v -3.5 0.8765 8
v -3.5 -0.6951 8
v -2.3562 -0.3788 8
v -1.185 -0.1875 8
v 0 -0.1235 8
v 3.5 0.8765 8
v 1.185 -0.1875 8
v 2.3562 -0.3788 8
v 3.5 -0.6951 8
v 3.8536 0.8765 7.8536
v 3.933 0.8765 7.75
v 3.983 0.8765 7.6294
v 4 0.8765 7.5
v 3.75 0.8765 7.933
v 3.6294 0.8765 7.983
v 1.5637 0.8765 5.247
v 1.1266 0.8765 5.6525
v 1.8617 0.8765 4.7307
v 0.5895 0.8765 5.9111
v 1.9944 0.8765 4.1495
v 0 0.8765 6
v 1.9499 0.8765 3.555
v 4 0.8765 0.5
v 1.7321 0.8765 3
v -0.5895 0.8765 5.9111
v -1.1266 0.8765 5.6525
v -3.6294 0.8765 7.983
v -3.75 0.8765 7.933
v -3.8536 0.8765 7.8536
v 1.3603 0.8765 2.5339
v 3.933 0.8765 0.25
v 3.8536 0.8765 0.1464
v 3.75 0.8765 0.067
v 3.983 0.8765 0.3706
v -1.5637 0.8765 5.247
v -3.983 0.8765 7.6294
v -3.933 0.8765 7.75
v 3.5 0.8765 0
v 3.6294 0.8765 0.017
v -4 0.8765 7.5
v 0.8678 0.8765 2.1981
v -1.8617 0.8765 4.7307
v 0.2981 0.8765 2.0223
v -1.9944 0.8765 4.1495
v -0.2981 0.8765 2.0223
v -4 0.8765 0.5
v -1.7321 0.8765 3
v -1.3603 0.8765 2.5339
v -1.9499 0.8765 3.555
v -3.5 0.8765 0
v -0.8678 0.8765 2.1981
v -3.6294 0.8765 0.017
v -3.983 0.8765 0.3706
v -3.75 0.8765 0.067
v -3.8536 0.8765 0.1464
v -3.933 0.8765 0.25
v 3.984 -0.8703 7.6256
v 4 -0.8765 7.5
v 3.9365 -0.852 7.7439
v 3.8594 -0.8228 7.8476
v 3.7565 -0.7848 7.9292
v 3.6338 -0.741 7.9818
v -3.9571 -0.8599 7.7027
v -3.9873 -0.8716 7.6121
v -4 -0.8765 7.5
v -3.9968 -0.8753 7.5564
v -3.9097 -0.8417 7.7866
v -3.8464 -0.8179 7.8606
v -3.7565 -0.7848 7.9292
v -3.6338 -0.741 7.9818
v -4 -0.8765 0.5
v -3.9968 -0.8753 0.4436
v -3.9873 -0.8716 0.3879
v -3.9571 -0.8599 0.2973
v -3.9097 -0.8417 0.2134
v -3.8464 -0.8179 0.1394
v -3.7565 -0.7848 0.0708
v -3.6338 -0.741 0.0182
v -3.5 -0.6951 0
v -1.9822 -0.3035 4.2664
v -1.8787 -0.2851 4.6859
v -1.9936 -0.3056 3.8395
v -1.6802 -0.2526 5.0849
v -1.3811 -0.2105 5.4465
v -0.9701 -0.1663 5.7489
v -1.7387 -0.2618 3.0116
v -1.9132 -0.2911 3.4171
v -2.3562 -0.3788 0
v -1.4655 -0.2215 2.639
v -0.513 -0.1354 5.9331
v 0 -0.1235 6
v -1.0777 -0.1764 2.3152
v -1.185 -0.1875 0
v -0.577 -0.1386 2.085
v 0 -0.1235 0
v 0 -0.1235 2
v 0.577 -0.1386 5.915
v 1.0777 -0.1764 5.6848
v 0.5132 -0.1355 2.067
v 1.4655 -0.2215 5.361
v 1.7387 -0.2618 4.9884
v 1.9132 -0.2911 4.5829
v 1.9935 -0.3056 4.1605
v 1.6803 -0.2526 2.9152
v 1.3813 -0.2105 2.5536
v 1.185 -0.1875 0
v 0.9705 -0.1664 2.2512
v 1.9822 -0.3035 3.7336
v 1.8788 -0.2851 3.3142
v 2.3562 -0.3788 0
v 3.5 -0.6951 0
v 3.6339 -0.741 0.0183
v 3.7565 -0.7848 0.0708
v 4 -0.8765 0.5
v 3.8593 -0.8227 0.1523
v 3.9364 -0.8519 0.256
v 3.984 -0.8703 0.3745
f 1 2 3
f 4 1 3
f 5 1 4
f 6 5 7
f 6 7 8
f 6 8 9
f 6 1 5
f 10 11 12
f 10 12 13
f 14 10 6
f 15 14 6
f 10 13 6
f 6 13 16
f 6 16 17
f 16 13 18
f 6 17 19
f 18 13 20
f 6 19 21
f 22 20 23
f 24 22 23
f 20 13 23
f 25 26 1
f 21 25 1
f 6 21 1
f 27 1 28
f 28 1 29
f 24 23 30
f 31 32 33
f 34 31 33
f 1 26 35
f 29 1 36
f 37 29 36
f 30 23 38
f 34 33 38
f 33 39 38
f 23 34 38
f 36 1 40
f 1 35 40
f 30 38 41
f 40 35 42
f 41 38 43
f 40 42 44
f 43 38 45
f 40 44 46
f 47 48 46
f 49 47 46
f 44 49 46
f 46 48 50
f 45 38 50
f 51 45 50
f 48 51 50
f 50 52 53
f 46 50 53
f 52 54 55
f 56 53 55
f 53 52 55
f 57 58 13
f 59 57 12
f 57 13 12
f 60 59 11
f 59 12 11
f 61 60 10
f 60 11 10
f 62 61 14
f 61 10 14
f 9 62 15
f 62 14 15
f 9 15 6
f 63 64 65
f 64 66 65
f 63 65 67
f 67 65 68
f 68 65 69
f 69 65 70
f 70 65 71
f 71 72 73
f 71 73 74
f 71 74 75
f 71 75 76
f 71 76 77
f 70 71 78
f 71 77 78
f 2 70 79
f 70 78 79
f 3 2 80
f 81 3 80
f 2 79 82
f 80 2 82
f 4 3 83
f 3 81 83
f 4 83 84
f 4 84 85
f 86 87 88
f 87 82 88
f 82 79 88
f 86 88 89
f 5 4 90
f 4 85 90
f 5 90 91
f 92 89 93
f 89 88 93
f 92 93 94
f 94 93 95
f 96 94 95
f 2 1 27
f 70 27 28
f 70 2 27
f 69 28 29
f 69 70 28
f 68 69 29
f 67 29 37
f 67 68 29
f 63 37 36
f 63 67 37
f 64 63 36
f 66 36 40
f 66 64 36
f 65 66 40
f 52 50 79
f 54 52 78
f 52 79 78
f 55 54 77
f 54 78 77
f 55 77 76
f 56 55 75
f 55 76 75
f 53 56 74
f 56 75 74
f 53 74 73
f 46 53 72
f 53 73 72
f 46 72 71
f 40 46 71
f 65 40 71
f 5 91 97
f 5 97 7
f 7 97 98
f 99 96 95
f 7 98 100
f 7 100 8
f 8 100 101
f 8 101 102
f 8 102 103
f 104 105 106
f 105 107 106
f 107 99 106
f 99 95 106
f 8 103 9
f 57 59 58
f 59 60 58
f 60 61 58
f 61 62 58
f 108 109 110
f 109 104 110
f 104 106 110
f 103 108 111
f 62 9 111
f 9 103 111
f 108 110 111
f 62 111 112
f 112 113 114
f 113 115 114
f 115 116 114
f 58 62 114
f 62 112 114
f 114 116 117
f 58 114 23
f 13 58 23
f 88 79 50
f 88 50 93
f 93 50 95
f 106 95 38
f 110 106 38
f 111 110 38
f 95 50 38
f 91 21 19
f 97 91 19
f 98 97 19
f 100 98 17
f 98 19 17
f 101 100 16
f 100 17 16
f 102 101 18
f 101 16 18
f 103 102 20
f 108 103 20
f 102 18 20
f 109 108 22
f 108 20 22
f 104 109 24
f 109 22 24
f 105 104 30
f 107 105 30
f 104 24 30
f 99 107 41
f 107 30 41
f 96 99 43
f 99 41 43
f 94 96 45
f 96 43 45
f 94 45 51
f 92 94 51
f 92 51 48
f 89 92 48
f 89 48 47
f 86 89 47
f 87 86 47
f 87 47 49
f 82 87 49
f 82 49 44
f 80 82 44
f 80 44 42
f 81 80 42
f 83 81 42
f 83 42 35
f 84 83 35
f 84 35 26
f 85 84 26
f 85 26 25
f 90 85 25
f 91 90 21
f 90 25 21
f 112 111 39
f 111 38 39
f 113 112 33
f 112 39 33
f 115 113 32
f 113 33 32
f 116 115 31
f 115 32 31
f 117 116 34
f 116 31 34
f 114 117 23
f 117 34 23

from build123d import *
from build123d.topology import SkipClean

# Parameters (mm, degrees)
DODANIE_WYCI_GNI_CIE1_DEPTH = 8
SZKIC2_R                    = 2
WYTNIJ_WYCI_GNI_CIE1_DEPTH  = 8
ZAOKR_GLENIE1_R             = 0.5


with BuildPart() as part:
    # Szkic1 → Dodanie-wyciągnięcie1 (new body)
    with BuildSketch(Plane.XY):
        with BuildLine():
            Line((0, 0.876524617), (0, -0.123475383))
            ThreePointArc((0, -0.123475383), (2.035134096, -0.3133769), (4, -0.876524617))
            Line((4, -0.876524617), (4, 0.876524617))
            Line((4, 0.876524617), (0, 0.876524617))
        make_face()
        with BuildLine():
            ThreePointArc((-4, -0.876524617), (-2.035134096, -0.3133769), (0, -0.123475383))
            Line((0, -0.123475383), (0, 0.876524617))
            Line((0, 0.876524617), (-4, 0.876524617))
            Line((-4, 0.876524617), (-4, -0.876524617))
        make_face()
    extrude(amount=DODANIE_WYCI_GNI_CIE1_DEPTH)

    # Szkic2 → Wytnij-wyciągnięcie1 (cut)
    with SkipClean():  # the faces are left unmerged after this step: merging them gives an invalid solid
        with BuildSketch(Plane(origin=(0, 0.876524617, 0), x_dir=(1, 0, 0), z_dir=(0, 1, 0))):
            with Locations(Location((0, -4, 0), (0, 0, 270))):
                Circle(SZKIC2_R)
        extrude(amount=-WYTNIJ_WYCI_GNI_CIE1_DEPTH, mode=Mode.SUBTRACT)

    # Zaokrąglenie1
    zaokr_glenie1_edges = [part.edges().sort_by_distance(p)[0] for p in [
        (4, 0, 8),
        (-4, 0, 8),
        (-4, 0, 0),
        (4, 0, 0),
    ]]
    fillet(zaokr_glenie1_edges, radius=ZAOKR_GLENIE1_R)


solid = part.part
